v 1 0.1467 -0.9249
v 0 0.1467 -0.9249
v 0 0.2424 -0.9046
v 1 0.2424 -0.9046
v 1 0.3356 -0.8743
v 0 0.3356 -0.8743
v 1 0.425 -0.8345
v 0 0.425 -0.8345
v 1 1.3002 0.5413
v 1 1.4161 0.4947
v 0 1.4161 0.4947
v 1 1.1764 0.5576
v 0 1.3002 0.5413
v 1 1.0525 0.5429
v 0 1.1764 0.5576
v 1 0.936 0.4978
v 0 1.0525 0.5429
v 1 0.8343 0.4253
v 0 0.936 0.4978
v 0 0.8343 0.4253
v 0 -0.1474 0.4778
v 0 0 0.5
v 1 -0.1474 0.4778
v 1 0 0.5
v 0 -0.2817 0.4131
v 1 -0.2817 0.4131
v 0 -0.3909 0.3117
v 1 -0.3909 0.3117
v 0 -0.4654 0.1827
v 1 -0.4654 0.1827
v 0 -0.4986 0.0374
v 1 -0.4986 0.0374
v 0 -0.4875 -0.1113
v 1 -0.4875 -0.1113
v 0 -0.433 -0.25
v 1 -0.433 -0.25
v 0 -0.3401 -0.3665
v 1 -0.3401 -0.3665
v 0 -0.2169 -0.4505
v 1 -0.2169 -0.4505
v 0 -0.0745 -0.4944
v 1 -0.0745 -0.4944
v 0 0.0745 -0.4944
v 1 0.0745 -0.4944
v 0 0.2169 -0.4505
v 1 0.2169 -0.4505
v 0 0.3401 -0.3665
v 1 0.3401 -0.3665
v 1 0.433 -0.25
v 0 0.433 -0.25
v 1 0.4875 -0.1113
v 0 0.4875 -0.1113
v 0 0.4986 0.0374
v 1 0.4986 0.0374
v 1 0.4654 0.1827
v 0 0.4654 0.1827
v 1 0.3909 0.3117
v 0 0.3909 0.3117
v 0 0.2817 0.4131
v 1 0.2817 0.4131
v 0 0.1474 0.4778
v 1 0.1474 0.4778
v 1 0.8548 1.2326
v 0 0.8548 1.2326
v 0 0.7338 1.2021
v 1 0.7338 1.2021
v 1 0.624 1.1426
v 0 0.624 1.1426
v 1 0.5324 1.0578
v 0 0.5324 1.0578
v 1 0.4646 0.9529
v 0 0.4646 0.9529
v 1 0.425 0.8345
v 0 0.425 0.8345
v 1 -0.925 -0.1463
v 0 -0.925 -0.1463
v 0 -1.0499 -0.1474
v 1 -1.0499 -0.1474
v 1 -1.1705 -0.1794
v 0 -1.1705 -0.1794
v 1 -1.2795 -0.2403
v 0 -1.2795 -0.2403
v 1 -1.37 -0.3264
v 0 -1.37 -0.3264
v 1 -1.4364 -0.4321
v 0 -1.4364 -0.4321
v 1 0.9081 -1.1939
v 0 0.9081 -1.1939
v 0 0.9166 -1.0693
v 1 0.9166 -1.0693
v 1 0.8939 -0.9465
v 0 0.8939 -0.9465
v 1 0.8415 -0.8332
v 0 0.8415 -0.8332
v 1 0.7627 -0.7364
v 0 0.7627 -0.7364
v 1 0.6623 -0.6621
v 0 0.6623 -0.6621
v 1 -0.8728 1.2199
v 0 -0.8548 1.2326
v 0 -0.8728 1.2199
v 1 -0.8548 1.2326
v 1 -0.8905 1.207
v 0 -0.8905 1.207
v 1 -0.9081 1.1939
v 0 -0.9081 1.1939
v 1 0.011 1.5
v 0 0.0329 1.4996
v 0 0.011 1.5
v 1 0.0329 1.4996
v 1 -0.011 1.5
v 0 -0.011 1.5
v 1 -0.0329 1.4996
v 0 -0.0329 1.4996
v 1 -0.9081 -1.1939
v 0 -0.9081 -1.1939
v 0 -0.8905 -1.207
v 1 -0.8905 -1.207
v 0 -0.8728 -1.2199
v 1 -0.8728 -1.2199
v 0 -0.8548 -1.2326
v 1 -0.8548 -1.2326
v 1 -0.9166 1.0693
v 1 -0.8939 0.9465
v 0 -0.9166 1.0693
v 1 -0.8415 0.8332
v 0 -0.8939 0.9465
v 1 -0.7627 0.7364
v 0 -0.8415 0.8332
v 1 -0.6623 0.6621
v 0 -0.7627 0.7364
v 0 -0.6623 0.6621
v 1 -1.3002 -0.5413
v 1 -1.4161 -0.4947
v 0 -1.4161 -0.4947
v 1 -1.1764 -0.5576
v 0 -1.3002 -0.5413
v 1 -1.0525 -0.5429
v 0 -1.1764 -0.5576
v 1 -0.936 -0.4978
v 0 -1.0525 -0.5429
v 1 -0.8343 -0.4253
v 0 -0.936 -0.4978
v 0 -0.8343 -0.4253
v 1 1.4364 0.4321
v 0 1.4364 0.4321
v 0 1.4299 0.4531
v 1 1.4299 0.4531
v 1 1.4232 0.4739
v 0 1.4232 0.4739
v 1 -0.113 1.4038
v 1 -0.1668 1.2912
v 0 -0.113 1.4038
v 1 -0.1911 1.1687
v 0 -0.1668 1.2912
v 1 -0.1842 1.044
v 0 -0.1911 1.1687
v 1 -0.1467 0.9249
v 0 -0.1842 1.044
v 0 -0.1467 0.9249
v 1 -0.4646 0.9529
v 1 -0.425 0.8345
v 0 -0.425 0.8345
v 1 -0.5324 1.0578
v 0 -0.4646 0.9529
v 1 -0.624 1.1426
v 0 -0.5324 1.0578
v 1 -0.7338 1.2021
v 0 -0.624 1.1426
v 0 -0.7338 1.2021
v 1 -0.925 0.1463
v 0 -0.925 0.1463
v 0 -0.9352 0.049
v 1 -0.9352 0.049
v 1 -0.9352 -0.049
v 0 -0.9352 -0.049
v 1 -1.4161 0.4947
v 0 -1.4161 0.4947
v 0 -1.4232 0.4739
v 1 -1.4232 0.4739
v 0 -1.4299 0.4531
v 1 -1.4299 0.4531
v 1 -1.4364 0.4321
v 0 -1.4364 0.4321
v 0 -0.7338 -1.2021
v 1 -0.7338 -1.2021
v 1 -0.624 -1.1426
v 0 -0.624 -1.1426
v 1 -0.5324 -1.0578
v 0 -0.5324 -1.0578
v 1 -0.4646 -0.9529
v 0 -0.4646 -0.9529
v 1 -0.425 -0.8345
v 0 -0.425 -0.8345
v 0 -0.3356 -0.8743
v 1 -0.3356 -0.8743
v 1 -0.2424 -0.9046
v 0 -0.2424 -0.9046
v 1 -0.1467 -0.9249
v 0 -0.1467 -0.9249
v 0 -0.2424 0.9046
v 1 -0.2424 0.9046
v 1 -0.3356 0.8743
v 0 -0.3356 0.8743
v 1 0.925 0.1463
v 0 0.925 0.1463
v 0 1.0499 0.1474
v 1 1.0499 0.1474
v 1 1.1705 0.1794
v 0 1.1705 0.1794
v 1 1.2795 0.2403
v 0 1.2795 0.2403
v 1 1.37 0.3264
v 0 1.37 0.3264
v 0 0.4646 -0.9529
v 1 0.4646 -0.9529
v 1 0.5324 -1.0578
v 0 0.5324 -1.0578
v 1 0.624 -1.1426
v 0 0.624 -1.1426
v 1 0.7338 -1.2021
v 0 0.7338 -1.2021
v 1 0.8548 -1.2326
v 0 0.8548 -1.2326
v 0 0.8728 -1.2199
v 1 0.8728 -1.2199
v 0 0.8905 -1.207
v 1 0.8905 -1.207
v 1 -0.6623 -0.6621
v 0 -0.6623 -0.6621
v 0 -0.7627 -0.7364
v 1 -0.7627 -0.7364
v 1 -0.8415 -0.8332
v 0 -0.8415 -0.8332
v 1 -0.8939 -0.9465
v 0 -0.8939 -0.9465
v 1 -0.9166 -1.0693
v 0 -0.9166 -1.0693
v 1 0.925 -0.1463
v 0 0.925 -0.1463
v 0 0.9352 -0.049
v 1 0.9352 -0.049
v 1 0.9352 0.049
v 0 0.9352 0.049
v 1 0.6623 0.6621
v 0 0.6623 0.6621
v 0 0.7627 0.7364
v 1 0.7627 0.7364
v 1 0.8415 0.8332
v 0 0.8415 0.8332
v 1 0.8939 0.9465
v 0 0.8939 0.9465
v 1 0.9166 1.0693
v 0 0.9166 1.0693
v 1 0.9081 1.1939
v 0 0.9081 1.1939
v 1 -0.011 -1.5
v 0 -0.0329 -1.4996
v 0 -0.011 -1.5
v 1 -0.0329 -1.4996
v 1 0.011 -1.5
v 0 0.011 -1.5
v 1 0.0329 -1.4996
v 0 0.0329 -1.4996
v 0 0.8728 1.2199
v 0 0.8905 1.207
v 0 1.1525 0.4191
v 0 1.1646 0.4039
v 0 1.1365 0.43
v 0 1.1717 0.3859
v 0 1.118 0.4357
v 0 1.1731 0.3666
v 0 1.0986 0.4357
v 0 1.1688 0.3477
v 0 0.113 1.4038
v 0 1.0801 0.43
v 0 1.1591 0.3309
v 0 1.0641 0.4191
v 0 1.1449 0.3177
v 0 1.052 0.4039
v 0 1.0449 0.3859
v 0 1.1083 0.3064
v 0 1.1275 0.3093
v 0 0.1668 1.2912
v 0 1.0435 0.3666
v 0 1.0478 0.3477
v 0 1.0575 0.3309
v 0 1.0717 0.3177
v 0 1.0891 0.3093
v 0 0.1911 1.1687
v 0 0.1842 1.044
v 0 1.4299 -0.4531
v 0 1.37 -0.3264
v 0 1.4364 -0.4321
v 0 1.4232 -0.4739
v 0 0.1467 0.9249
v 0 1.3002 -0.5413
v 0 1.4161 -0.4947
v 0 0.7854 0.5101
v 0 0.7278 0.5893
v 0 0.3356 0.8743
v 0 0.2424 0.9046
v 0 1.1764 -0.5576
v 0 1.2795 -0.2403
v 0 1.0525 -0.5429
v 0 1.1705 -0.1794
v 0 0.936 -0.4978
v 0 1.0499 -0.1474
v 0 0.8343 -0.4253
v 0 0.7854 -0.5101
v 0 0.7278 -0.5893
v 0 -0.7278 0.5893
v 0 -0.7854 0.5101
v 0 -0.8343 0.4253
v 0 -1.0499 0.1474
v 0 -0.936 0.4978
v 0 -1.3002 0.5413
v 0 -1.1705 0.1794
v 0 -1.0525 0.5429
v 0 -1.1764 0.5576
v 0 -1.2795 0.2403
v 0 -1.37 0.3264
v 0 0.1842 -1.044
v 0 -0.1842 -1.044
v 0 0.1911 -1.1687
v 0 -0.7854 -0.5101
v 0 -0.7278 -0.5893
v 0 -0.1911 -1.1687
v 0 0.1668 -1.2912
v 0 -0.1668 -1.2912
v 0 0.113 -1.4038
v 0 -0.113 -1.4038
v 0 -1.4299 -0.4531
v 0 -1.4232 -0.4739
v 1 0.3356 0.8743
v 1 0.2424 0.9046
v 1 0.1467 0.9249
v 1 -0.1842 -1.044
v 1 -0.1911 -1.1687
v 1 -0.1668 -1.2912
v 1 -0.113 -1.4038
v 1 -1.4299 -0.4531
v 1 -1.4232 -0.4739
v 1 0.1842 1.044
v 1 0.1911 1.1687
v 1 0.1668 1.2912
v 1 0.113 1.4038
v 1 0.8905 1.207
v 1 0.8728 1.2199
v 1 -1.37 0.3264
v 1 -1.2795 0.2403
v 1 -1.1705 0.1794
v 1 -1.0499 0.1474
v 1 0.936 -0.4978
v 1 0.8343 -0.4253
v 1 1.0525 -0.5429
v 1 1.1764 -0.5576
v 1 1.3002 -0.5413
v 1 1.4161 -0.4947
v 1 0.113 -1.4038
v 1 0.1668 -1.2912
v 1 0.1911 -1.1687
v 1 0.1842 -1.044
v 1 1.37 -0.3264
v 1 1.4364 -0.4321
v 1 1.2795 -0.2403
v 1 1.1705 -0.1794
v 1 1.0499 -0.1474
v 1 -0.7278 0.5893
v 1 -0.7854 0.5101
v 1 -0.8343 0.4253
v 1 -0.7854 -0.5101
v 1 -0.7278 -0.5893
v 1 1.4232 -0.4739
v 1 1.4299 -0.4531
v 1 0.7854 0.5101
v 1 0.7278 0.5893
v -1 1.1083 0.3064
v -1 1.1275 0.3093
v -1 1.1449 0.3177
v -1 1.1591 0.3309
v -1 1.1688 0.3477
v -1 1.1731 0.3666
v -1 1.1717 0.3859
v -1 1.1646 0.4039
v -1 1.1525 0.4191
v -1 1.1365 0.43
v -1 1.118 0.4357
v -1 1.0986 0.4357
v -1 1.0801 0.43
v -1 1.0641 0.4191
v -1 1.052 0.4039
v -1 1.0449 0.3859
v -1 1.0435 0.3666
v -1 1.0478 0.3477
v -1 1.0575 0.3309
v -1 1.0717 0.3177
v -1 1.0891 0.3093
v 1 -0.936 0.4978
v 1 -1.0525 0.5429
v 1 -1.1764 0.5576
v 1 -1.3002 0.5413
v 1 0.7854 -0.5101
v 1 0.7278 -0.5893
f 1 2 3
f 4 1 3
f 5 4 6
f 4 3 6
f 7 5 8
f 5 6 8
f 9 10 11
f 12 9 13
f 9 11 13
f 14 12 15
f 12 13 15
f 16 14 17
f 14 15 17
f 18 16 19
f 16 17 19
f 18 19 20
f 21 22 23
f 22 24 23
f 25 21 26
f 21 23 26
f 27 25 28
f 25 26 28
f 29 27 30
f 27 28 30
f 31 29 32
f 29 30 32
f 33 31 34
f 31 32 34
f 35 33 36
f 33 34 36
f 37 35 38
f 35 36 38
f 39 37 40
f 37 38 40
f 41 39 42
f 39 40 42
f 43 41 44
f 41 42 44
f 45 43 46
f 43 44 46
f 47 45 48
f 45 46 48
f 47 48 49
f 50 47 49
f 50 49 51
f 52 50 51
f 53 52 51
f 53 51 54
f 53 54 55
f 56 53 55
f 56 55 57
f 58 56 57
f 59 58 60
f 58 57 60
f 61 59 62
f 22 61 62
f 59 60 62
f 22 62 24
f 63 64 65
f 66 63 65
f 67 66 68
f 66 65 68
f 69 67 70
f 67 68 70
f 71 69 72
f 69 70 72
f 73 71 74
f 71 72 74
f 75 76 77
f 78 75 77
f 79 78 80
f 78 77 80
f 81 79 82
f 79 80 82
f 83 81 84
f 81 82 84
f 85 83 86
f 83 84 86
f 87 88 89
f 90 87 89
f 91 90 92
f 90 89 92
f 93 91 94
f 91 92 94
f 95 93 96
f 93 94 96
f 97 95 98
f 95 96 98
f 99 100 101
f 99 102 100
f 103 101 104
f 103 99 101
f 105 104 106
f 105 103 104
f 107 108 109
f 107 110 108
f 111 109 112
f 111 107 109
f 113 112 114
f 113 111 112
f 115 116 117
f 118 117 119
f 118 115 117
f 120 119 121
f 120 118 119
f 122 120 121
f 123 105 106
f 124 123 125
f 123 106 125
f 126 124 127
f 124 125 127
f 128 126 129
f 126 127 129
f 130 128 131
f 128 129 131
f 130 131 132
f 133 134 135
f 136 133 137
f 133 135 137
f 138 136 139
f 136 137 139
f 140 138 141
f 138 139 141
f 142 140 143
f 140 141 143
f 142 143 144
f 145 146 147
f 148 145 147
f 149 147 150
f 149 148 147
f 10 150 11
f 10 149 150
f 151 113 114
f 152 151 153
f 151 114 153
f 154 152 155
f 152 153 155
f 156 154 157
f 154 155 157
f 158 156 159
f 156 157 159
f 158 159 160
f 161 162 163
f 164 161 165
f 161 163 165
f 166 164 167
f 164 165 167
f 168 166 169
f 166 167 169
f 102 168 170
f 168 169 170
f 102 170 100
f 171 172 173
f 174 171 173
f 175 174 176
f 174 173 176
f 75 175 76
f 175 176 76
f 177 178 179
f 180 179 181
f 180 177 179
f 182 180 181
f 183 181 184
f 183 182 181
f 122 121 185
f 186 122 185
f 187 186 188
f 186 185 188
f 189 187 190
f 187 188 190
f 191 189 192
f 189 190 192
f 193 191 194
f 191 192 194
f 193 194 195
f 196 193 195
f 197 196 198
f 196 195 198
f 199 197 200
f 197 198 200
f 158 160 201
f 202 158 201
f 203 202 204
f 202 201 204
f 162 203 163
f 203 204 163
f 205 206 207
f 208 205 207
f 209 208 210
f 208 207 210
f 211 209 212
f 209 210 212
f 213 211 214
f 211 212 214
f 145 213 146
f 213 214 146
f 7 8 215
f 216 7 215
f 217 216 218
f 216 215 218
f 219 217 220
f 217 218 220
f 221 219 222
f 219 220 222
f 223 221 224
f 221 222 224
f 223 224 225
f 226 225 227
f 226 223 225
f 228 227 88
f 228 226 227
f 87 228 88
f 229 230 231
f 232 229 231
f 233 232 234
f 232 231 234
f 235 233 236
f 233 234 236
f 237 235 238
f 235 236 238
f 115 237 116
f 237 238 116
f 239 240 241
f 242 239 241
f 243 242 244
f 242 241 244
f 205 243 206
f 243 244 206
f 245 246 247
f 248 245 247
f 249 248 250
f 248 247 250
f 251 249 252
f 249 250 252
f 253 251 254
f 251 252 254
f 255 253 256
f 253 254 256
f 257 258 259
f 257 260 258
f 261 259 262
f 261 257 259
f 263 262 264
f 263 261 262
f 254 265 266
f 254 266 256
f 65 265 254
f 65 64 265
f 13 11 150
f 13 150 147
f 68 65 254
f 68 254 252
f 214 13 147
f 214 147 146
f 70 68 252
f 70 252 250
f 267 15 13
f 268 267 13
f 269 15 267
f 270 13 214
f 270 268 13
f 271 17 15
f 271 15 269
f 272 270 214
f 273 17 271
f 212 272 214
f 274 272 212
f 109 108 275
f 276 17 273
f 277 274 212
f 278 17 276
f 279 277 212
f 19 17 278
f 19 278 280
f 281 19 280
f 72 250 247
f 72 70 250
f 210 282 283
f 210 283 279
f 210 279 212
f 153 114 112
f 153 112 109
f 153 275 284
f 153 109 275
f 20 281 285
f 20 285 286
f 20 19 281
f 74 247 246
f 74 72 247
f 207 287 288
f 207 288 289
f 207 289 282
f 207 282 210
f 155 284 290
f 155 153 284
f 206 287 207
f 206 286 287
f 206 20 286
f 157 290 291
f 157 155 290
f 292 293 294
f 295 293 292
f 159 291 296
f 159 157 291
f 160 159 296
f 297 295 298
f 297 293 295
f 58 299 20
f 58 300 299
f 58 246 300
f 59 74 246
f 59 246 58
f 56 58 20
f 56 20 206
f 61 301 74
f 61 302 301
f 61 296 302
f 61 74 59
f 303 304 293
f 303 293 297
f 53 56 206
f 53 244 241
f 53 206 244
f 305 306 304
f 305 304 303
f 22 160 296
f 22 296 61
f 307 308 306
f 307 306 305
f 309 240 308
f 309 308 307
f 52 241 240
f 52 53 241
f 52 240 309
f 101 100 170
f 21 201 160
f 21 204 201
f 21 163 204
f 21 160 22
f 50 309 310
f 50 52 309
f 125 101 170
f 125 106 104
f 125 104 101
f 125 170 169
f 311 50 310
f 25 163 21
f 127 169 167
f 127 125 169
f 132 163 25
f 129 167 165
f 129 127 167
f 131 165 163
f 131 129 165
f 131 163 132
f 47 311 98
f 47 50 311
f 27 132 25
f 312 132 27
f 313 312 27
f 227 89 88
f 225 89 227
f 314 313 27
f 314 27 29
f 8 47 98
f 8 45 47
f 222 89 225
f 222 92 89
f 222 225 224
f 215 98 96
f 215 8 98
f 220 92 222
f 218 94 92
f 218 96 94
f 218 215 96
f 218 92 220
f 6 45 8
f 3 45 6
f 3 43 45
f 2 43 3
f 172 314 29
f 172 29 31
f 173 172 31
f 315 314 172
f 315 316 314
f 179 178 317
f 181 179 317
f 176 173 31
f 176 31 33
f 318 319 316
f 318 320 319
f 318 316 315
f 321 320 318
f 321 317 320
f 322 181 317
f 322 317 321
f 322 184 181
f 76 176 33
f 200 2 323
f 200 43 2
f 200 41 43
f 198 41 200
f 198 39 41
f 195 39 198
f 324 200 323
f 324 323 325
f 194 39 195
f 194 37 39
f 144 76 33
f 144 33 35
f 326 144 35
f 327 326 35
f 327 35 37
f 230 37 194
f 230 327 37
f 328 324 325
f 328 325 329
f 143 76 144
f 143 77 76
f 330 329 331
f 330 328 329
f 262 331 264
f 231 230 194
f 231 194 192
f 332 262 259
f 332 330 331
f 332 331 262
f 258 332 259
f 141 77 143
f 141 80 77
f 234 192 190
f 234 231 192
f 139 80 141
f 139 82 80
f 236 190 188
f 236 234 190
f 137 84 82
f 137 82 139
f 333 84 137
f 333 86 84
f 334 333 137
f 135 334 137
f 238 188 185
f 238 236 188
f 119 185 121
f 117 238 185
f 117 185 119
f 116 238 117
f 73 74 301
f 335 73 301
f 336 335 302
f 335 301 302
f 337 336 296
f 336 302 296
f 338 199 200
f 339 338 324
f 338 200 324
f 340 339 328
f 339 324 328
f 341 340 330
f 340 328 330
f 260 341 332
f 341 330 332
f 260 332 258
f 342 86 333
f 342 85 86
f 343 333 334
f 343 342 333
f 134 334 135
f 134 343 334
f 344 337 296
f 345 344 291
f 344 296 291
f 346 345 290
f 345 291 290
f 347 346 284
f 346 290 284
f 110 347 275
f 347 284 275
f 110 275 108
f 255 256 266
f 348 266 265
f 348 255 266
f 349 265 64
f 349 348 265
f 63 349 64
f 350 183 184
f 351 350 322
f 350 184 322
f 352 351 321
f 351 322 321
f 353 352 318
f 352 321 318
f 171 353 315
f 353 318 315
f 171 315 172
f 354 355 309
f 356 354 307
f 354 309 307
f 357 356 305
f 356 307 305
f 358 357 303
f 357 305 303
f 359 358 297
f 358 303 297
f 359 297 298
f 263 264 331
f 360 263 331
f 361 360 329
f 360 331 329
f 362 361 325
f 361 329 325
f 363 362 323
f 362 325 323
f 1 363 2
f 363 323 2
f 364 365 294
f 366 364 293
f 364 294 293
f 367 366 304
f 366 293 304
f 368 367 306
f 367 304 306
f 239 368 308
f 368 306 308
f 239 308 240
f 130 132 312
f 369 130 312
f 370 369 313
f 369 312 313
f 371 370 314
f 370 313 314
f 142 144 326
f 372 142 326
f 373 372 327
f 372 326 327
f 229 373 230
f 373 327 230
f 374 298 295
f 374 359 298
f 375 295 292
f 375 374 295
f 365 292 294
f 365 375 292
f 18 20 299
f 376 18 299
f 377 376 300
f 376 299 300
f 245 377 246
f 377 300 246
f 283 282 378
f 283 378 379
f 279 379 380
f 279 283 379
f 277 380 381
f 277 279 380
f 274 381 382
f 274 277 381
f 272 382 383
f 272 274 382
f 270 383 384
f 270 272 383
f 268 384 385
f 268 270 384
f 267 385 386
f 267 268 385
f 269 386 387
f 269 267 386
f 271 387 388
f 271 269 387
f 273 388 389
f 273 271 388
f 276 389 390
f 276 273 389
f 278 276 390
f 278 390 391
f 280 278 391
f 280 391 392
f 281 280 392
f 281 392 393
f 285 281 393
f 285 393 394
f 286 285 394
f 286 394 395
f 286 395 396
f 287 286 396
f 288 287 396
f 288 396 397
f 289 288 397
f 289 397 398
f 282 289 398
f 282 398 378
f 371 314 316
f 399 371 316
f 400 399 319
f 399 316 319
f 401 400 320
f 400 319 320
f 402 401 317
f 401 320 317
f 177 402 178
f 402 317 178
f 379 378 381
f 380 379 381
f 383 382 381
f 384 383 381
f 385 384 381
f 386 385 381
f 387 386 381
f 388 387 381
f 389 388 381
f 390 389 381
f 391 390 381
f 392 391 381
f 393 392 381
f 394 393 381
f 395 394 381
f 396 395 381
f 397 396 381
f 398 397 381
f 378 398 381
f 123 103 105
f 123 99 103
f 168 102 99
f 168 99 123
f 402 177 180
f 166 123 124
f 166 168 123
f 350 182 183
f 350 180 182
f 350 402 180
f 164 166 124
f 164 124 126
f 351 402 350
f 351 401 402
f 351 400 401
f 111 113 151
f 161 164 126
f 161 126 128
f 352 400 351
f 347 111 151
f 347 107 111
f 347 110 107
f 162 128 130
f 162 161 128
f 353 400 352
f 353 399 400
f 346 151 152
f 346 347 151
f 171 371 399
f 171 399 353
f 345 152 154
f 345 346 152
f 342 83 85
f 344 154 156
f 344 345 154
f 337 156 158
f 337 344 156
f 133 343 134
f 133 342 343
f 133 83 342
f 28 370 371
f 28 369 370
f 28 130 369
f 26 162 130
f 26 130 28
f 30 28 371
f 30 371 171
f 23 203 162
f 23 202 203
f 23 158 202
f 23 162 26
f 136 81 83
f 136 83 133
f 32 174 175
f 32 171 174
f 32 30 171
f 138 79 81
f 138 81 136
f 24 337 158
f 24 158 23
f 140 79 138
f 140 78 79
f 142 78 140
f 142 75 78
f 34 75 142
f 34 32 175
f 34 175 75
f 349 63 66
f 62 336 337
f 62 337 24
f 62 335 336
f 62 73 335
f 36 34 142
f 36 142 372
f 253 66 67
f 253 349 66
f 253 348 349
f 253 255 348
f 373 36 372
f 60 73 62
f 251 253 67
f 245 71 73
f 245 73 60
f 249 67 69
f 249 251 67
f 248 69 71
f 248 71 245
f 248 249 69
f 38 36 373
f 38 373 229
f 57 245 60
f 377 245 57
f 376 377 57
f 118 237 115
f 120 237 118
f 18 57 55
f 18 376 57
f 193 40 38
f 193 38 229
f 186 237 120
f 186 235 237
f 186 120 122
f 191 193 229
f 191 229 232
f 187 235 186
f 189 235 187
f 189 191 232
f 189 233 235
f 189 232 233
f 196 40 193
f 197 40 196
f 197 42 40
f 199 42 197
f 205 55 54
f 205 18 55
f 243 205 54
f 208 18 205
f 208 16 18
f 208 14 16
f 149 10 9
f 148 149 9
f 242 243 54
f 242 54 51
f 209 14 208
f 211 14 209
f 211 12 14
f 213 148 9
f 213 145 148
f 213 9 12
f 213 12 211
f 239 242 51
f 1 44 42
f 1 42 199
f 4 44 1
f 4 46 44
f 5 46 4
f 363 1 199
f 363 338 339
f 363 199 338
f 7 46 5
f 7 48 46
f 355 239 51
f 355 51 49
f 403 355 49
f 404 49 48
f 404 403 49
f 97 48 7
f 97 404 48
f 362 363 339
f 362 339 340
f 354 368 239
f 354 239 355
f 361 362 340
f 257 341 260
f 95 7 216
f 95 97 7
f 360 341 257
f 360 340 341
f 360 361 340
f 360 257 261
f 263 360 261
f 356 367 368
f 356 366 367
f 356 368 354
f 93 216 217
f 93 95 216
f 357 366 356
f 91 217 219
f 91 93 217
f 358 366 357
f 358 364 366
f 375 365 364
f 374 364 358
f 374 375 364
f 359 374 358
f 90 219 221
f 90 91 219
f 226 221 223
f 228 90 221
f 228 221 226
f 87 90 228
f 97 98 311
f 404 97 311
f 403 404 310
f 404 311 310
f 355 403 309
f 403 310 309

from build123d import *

# Parameters (mm, degrees)
BASPROSKE_W     = 1
BASPROSKE_H     = 1.5
TOOTHCUT_DEPTH  = 3.34520788
TEETHCUTS_COUNT = 10
TEETHCUTS_ANGLE = 324
BORSKE_R        = 0.5
BORE_DEPTH      = 50.0000508
SKETCH_1_R      = 0.065
EXTRUDE_2_DEPTH = 2


with BuildPart() as part:
    # BasProSke → Base-Revolve (revolve)
    with BuildSketch(Plane(origin=(0, 0, 0), x_dir=(1, 0, 0), z_dir=(0, 1, 0)), mode=Mode.PRIVATE) as base_revolve_sk:
        with Locations((0.5, 0.75)):
            Rectangle(BASPROSKE_W, BASPROSKE_H)
    revolve(base_revolve_sk.sketch.rotate(Axis((-10, 0, 0), (1, 0, 0)), 180), axis=Axis((-10, 0, 0), (1, 0, 0)))

    # TooCutSke → ToothCut (cut, through all)
    with BuildSketch(Plane(origin=(0, 0, 0), x_dir=(0, 0, -1), z_dir=(1, 0, 0))):
        with BuildLine():
            ThreePointArc((0.146321185, 0.924998573), (0, 0.9365), (-0.146321185, 0.924998573))
            ThreePointArc((-0.146321185, 0.924998573), (-0.216454601, 1.244005636), (-0.468585949, 1.451644712))
            ThreePointArc((-0.468585949, 1.451644712), (0, 1.5254), (0.468585949, 1.451644712))
            ThreePointArc((0.468585949, 1.451644712), (0.216454601, 1.244005636), (0.146321185, 0.924998573))
        make_face()
    toothcut = extrude(amount=TOOTHCUT_DEPTH, mode=Mode.SUBTRACT)

    # TeethCuts: ToothCut ×10 about axis
    teethcuts_axis = Axis((-10, 0, 0), (1, 0, 0))
    for i in range(1, TEETHCUTS_COUNT):
        add(toothcut.rotate(teethcuts_axis, i * TEETHCUTS_ANGLE / (TEETHCUTS_COUNT - 1)), mode=Mode.SUBTRACT)

    # BorSke → Bore (cut, symmetric)
    with BuildSketch(Plane(origin=(0, 0, 0), x_dir=(0, 0, -1), z_dir=(1, 0, 0))):
        with Locations(Location((0, 0, 0), (0, 0, 180))):
            Circle(BORSKE_R)
    extrude(amount=BORE_DEPTH, both=True, mode=Mode.SUBTRACT)

    # 草圖1 → 填料-伸長2 (add)
    with BuildSketch(Plane(origin=(1, 0, 0), x_dir=(0, 0, -1), z_dir=(1, 0, 0))):
        with Locations((-0.371432866, 1.108307745)):
            Circle(SKETCH_1_R)
    extrude(amount=-EXTRUDE_2_DEPTH)


solid = part.part
